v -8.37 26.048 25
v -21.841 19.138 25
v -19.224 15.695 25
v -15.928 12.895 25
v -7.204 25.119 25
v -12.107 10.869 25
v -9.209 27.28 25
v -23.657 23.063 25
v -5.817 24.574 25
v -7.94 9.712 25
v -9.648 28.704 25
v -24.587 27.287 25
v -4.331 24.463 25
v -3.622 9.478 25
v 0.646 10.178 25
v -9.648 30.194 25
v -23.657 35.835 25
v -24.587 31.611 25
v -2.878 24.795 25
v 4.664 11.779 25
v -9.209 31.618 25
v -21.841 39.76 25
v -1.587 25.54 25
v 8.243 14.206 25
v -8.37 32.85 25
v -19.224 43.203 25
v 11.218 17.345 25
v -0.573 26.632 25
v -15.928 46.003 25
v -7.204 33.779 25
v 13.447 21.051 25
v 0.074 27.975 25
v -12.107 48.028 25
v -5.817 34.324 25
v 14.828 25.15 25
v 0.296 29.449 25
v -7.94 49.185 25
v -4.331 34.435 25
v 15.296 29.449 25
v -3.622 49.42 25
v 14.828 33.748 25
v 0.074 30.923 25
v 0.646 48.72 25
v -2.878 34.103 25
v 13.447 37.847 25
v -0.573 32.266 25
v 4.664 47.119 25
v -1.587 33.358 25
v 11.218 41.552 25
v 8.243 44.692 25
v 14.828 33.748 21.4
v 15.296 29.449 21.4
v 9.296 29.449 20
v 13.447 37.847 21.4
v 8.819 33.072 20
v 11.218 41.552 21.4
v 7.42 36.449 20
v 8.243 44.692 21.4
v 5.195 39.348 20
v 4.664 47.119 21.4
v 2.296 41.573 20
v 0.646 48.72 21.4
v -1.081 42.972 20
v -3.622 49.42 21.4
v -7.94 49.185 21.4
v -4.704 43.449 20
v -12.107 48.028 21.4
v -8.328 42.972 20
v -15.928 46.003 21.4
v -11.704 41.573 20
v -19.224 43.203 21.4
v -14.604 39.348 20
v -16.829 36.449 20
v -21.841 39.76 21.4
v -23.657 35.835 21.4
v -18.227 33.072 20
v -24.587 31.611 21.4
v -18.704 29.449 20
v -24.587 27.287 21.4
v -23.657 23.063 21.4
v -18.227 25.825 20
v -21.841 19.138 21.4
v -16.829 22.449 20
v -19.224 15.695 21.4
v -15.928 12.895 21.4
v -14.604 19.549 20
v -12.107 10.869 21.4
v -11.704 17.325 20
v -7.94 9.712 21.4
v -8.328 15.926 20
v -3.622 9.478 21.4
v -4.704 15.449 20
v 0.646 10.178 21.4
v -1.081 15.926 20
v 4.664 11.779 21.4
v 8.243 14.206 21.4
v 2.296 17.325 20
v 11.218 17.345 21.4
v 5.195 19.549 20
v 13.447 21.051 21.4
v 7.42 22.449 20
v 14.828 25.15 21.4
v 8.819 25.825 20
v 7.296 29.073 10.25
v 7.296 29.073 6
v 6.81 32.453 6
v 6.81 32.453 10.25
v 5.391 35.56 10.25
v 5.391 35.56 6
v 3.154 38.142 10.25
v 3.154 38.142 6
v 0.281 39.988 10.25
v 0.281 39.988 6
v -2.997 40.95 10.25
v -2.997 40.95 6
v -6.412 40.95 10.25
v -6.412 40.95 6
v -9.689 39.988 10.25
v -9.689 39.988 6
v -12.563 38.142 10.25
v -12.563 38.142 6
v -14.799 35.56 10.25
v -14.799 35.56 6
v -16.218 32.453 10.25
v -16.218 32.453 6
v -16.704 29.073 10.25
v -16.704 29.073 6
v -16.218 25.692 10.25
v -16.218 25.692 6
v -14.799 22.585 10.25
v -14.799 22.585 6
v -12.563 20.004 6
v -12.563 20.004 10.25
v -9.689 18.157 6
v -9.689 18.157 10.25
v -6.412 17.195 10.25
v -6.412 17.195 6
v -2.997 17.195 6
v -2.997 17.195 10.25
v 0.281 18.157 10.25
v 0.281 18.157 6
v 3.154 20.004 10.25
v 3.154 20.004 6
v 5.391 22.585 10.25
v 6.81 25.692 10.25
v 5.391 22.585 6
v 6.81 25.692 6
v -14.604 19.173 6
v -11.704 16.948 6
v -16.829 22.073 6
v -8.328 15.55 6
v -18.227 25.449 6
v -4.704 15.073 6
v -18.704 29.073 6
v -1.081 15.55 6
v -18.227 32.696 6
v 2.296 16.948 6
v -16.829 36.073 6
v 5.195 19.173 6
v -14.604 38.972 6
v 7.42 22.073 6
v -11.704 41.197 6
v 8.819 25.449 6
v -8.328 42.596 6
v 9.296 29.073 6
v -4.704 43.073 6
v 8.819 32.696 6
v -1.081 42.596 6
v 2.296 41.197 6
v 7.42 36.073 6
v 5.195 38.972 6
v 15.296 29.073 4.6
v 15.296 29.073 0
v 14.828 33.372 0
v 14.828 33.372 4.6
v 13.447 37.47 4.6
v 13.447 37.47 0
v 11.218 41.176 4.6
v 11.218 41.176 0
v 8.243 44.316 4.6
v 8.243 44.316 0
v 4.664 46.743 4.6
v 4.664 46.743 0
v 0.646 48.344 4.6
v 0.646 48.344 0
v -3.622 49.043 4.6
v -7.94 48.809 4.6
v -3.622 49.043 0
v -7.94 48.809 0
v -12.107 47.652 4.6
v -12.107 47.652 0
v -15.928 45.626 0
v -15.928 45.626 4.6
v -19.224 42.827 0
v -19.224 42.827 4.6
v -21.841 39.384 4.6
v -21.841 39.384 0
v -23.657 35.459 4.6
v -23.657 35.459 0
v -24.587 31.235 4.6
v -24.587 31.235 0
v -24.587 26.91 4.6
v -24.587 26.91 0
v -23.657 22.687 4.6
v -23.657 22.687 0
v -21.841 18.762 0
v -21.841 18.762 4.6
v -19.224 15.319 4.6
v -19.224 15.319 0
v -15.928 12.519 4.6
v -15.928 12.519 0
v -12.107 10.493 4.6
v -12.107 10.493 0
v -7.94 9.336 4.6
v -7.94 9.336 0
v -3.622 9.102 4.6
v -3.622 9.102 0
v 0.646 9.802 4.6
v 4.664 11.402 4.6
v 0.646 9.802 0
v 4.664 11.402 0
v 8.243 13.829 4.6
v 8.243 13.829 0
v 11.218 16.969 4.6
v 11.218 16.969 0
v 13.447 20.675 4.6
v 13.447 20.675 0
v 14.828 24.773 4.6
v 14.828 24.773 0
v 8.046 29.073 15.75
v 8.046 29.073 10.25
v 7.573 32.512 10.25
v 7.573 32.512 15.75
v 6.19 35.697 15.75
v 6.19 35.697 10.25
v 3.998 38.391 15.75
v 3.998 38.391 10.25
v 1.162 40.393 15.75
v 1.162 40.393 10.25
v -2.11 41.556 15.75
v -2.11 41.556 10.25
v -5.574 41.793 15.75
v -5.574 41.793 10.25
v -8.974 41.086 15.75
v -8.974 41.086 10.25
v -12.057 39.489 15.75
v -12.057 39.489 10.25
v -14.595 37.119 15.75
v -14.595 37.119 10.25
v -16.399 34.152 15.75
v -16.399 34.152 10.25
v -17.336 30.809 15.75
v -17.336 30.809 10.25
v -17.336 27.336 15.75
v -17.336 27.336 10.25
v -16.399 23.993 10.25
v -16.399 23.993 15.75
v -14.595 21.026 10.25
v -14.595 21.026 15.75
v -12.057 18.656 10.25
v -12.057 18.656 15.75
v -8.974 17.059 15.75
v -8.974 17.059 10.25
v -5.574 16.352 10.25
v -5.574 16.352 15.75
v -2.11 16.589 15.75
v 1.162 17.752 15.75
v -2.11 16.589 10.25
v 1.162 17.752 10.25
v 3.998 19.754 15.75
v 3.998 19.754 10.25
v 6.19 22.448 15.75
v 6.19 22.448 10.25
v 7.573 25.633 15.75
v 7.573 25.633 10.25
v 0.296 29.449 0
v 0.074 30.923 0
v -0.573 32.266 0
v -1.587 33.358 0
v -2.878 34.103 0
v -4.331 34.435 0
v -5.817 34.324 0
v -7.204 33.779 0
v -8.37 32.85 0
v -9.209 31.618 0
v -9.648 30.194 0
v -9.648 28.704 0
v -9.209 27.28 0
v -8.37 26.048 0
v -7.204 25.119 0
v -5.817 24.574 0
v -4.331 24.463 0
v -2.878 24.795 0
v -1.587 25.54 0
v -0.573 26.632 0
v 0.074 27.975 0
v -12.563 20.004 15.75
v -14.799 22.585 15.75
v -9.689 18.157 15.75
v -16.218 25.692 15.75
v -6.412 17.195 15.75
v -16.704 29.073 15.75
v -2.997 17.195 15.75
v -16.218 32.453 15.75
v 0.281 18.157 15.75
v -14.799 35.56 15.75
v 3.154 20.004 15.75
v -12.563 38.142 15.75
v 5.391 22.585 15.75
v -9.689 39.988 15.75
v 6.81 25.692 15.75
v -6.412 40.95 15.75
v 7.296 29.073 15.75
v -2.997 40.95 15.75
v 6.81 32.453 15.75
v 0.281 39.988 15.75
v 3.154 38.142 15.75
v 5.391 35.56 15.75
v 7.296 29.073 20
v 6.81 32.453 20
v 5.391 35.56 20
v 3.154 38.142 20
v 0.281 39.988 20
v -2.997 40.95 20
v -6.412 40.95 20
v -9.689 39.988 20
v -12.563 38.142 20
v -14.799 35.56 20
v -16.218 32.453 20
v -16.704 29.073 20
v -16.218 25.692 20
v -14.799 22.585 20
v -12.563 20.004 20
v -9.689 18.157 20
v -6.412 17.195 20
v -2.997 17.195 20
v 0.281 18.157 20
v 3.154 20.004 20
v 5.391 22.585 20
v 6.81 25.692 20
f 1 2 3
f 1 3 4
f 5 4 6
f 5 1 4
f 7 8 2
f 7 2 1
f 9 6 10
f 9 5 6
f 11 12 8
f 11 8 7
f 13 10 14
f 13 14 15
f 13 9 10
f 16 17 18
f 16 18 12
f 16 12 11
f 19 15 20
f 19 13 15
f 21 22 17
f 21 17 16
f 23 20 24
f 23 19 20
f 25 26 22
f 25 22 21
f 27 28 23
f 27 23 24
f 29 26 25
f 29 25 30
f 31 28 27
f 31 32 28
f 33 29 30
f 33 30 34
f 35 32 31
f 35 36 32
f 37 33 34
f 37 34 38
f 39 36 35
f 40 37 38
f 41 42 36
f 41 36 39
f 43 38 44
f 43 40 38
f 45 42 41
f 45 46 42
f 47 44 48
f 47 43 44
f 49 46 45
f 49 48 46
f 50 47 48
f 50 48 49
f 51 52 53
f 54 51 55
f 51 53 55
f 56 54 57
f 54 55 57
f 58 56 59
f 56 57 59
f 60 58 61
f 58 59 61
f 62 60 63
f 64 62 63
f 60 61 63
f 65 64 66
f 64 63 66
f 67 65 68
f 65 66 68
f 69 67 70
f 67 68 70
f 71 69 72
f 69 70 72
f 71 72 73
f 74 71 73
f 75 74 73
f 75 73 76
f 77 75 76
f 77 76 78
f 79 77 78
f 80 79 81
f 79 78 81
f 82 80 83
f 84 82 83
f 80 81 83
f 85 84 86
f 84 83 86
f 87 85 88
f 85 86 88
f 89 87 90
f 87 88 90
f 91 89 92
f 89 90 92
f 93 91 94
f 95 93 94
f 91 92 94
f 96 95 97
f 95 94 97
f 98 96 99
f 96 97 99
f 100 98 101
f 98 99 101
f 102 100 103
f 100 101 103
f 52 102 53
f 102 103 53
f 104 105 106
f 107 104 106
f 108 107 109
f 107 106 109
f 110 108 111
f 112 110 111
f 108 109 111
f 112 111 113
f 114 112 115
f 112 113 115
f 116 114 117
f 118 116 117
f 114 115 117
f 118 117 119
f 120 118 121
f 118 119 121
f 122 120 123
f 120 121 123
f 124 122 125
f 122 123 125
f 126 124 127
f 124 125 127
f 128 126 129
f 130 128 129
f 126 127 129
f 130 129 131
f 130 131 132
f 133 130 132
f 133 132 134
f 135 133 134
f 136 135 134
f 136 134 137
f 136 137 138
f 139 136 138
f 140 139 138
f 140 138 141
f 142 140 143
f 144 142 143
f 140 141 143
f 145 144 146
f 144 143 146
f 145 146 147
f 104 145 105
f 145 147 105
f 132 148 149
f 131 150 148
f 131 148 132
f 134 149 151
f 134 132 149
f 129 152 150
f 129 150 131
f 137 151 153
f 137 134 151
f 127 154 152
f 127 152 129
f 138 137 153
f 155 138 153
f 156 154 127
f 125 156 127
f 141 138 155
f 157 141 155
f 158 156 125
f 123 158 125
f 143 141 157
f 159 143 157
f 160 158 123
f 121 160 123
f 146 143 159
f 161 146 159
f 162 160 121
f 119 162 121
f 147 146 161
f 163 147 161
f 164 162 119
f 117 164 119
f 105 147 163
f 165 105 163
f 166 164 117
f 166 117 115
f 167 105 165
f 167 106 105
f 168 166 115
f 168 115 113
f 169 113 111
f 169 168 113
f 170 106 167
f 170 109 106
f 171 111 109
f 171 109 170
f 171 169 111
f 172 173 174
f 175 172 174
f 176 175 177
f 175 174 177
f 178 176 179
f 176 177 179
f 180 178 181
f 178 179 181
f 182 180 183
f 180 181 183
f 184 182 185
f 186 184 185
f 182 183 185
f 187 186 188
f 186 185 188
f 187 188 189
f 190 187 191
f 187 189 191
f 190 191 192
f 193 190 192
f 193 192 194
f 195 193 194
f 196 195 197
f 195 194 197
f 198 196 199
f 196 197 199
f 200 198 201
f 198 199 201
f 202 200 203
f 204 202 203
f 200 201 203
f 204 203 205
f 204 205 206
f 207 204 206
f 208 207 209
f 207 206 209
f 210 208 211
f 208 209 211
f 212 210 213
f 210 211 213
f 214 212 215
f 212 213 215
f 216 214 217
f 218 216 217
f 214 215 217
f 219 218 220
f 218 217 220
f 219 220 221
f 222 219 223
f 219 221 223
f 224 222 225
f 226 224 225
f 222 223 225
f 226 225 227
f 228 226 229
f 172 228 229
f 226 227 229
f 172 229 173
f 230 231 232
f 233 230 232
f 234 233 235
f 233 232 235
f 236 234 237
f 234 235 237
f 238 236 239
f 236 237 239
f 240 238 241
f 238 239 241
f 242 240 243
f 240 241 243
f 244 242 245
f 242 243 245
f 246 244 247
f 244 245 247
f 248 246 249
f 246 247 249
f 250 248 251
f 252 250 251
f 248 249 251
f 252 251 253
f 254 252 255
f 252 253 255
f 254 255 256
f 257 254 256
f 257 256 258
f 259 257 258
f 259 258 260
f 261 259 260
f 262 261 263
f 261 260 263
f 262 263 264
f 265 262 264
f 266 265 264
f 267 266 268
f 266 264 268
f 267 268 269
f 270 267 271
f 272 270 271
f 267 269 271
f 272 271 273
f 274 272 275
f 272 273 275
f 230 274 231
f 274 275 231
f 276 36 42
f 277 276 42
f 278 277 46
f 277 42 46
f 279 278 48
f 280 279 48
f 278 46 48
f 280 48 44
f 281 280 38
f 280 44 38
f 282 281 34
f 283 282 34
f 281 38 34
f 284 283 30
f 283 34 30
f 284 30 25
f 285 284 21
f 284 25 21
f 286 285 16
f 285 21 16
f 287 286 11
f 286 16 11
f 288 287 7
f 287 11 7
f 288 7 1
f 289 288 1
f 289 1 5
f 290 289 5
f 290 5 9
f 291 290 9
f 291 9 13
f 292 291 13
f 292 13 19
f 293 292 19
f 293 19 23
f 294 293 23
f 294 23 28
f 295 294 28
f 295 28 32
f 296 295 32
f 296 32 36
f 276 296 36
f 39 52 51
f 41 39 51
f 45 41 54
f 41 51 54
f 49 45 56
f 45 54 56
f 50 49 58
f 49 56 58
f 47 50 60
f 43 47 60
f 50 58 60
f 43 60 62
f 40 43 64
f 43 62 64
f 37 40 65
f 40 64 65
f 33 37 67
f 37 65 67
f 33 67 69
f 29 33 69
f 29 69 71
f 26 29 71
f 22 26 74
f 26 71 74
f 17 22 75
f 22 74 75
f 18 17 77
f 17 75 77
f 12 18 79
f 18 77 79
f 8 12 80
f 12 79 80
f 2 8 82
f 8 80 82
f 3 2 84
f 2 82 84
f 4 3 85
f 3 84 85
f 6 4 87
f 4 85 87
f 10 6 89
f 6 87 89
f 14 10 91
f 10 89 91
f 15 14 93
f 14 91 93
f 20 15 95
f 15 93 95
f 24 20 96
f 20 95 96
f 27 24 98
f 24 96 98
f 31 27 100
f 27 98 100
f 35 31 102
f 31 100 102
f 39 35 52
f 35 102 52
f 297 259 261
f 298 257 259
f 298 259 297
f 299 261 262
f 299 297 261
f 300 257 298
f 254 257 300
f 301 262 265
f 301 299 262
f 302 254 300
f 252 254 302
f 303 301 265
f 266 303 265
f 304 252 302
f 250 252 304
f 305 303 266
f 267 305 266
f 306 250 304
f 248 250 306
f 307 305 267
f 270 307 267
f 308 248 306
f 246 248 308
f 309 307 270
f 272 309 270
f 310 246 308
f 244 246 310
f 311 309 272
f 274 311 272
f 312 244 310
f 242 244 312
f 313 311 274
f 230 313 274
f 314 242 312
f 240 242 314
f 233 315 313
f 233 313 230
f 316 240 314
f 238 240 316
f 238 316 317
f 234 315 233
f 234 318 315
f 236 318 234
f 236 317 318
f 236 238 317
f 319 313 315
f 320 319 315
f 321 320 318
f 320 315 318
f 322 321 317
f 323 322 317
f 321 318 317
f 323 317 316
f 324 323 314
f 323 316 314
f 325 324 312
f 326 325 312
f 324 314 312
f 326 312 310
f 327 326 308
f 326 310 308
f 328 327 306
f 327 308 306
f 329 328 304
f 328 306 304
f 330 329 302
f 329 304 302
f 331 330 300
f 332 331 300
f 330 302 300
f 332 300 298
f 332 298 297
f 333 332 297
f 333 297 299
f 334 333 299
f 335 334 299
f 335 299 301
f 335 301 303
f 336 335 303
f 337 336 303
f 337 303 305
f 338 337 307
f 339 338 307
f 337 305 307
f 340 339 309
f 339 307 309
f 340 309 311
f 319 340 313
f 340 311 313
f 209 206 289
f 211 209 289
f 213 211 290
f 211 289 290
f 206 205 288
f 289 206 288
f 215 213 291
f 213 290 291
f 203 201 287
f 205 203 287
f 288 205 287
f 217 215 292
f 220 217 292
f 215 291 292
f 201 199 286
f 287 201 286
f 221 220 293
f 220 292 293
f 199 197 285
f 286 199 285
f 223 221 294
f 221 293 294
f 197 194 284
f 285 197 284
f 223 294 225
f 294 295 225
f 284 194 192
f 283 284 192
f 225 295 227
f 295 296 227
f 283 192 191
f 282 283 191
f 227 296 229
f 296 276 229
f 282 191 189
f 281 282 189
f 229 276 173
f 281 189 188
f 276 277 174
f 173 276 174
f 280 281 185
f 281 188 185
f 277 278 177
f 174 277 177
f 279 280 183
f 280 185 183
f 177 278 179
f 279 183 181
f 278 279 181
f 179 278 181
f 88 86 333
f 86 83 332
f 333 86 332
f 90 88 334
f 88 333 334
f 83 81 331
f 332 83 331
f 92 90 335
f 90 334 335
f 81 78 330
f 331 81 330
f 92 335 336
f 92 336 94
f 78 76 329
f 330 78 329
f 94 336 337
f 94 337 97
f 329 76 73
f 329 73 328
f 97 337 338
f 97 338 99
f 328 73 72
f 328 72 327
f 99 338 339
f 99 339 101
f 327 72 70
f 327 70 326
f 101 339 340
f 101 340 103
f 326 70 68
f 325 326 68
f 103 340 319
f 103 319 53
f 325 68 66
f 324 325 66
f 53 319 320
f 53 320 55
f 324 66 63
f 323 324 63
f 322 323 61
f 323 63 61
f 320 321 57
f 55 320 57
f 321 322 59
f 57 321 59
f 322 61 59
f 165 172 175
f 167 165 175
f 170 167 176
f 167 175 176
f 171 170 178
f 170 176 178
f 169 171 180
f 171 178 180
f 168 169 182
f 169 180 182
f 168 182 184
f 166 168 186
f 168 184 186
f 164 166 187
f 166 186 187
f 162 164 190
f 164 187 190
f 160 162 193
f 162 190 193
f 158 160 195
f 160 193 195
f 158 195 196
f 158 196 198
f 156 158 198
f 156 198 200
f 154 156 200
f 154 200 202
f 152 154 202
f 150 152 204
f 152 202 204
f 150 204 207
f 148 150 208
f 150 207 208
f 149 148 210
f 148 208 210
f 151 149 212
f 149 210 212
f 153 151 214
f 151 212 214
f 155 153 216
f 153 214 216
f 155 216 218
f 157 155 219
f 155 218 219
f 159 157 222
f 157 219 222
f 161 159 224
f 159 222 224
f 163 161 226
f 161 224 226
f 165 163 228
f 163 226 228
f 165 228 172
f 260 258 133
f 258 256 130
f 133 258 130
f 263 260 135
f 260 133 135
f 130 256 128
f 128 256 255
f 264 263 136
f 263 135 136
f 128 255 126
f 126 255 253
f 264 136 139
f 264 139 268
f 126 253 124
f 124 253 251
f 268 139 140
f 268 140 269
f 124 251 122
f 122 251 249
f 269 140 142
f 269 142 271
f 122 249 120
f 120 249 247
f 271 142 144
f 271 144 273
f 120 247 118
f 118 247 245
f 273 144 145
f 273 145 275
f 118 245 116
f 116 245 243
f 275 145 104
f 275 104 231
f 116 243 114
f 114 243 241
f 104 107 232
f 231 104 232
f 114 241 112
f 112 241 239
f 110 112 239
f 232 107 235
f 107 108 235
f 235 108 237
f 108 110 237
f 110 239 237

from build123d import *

# Parameters (mm, degrees)
F0_R      = 20
F1_DEPTH  = 6
F2_R      = 12
F3_DEPTH  = 4.25
F4_R      = 12.75
F5_DEPTH  = 5.5
F6_R      = 12
F8_DEPTH  = 4.25
F10_R     = 20
F11_DEPTH = 5
F12_R     = 5
F13_DEPTH = 25.001
F14_SIZE2 = 1.4
F14_SIZE  = 6
F15_SIZE2 = 6
F15_SIZE  = 1.4


with BuildPart() as f1:
    # F0 (on Top) → F1 (new body)
    with BuildSketch(Plane.XY):
        with Locations((-4.7043012455, 29.0725808591)):
            Circle(F0_R)
    extrude(amount=F1_DEPTH)

    # F2 (on face) → F3 (join)
    with BuildSketch(Plane.XY.offset(6)):
        with Locations((-4.7043012455, 29.0725808591)):
            Circle(F2_R)
    extrude(amount=F3_DEPTH)

    # F4 (on face) → F5 (join)
    with BuildSketch(Plane.XY.offset(10.25)):
        with Locations((-4.7043012455, 29.0725808591)):
            Circle(F4_R)
    extrude(amount=F5_DEPTH)

    # F6 (on face) → F8 (join)
    with BuildSketch(Plane.XY.offset(15.75)):
        with Locations((-4.7043012455, 29.0725808591)):
            Circle(F6_R)
    extrude(amount=F8_DEPTH)

    # F10 (on face) → F11 (join)
    with BuildSketch(Plane.XY.offset(20)):
        with Locations((-4.7043012455, 29.4489245862)):
            Circle(F10_R)
    extrude(amount=F11_DEPTH)

    # F12 (on face) → F13 (cut, through all)
    with BuildSketch(Plane.XY.offset(25)):
        with Locations((-4.7043012455, 29.4489245862)):
            Circle(F12_R)
    extrude(amount=-F13_DEPTH, mode=Mode.SUBTRACT)

    # F14
    f14_edges = [f1.edges().sort_by_distance(p)[0] for p in [
        (-24.704301, 29.072581, 6),
    ]]
    f14_side = f1.faces().sort_by_distance((-24.138616, 29.072581, 6))[0]
    chamfer(f14_edges, length=F14_SIZE, length2=F14_SIZE2, reference=f14_side)

    # F15
    f15_edges = [f1.edges().sort_by_distance(p)[0] for p in [
        (-24.704301, 29.448925, 20),
    ]]
    f15_side = f1.faces().sort_by_distance((-24.704301, 29.448925, 22.5))[0]
    chamfer(f15_edges, length=F15_SIZE, length2=F15_SIZE2, reference=f15_side)


solid = f1.part
